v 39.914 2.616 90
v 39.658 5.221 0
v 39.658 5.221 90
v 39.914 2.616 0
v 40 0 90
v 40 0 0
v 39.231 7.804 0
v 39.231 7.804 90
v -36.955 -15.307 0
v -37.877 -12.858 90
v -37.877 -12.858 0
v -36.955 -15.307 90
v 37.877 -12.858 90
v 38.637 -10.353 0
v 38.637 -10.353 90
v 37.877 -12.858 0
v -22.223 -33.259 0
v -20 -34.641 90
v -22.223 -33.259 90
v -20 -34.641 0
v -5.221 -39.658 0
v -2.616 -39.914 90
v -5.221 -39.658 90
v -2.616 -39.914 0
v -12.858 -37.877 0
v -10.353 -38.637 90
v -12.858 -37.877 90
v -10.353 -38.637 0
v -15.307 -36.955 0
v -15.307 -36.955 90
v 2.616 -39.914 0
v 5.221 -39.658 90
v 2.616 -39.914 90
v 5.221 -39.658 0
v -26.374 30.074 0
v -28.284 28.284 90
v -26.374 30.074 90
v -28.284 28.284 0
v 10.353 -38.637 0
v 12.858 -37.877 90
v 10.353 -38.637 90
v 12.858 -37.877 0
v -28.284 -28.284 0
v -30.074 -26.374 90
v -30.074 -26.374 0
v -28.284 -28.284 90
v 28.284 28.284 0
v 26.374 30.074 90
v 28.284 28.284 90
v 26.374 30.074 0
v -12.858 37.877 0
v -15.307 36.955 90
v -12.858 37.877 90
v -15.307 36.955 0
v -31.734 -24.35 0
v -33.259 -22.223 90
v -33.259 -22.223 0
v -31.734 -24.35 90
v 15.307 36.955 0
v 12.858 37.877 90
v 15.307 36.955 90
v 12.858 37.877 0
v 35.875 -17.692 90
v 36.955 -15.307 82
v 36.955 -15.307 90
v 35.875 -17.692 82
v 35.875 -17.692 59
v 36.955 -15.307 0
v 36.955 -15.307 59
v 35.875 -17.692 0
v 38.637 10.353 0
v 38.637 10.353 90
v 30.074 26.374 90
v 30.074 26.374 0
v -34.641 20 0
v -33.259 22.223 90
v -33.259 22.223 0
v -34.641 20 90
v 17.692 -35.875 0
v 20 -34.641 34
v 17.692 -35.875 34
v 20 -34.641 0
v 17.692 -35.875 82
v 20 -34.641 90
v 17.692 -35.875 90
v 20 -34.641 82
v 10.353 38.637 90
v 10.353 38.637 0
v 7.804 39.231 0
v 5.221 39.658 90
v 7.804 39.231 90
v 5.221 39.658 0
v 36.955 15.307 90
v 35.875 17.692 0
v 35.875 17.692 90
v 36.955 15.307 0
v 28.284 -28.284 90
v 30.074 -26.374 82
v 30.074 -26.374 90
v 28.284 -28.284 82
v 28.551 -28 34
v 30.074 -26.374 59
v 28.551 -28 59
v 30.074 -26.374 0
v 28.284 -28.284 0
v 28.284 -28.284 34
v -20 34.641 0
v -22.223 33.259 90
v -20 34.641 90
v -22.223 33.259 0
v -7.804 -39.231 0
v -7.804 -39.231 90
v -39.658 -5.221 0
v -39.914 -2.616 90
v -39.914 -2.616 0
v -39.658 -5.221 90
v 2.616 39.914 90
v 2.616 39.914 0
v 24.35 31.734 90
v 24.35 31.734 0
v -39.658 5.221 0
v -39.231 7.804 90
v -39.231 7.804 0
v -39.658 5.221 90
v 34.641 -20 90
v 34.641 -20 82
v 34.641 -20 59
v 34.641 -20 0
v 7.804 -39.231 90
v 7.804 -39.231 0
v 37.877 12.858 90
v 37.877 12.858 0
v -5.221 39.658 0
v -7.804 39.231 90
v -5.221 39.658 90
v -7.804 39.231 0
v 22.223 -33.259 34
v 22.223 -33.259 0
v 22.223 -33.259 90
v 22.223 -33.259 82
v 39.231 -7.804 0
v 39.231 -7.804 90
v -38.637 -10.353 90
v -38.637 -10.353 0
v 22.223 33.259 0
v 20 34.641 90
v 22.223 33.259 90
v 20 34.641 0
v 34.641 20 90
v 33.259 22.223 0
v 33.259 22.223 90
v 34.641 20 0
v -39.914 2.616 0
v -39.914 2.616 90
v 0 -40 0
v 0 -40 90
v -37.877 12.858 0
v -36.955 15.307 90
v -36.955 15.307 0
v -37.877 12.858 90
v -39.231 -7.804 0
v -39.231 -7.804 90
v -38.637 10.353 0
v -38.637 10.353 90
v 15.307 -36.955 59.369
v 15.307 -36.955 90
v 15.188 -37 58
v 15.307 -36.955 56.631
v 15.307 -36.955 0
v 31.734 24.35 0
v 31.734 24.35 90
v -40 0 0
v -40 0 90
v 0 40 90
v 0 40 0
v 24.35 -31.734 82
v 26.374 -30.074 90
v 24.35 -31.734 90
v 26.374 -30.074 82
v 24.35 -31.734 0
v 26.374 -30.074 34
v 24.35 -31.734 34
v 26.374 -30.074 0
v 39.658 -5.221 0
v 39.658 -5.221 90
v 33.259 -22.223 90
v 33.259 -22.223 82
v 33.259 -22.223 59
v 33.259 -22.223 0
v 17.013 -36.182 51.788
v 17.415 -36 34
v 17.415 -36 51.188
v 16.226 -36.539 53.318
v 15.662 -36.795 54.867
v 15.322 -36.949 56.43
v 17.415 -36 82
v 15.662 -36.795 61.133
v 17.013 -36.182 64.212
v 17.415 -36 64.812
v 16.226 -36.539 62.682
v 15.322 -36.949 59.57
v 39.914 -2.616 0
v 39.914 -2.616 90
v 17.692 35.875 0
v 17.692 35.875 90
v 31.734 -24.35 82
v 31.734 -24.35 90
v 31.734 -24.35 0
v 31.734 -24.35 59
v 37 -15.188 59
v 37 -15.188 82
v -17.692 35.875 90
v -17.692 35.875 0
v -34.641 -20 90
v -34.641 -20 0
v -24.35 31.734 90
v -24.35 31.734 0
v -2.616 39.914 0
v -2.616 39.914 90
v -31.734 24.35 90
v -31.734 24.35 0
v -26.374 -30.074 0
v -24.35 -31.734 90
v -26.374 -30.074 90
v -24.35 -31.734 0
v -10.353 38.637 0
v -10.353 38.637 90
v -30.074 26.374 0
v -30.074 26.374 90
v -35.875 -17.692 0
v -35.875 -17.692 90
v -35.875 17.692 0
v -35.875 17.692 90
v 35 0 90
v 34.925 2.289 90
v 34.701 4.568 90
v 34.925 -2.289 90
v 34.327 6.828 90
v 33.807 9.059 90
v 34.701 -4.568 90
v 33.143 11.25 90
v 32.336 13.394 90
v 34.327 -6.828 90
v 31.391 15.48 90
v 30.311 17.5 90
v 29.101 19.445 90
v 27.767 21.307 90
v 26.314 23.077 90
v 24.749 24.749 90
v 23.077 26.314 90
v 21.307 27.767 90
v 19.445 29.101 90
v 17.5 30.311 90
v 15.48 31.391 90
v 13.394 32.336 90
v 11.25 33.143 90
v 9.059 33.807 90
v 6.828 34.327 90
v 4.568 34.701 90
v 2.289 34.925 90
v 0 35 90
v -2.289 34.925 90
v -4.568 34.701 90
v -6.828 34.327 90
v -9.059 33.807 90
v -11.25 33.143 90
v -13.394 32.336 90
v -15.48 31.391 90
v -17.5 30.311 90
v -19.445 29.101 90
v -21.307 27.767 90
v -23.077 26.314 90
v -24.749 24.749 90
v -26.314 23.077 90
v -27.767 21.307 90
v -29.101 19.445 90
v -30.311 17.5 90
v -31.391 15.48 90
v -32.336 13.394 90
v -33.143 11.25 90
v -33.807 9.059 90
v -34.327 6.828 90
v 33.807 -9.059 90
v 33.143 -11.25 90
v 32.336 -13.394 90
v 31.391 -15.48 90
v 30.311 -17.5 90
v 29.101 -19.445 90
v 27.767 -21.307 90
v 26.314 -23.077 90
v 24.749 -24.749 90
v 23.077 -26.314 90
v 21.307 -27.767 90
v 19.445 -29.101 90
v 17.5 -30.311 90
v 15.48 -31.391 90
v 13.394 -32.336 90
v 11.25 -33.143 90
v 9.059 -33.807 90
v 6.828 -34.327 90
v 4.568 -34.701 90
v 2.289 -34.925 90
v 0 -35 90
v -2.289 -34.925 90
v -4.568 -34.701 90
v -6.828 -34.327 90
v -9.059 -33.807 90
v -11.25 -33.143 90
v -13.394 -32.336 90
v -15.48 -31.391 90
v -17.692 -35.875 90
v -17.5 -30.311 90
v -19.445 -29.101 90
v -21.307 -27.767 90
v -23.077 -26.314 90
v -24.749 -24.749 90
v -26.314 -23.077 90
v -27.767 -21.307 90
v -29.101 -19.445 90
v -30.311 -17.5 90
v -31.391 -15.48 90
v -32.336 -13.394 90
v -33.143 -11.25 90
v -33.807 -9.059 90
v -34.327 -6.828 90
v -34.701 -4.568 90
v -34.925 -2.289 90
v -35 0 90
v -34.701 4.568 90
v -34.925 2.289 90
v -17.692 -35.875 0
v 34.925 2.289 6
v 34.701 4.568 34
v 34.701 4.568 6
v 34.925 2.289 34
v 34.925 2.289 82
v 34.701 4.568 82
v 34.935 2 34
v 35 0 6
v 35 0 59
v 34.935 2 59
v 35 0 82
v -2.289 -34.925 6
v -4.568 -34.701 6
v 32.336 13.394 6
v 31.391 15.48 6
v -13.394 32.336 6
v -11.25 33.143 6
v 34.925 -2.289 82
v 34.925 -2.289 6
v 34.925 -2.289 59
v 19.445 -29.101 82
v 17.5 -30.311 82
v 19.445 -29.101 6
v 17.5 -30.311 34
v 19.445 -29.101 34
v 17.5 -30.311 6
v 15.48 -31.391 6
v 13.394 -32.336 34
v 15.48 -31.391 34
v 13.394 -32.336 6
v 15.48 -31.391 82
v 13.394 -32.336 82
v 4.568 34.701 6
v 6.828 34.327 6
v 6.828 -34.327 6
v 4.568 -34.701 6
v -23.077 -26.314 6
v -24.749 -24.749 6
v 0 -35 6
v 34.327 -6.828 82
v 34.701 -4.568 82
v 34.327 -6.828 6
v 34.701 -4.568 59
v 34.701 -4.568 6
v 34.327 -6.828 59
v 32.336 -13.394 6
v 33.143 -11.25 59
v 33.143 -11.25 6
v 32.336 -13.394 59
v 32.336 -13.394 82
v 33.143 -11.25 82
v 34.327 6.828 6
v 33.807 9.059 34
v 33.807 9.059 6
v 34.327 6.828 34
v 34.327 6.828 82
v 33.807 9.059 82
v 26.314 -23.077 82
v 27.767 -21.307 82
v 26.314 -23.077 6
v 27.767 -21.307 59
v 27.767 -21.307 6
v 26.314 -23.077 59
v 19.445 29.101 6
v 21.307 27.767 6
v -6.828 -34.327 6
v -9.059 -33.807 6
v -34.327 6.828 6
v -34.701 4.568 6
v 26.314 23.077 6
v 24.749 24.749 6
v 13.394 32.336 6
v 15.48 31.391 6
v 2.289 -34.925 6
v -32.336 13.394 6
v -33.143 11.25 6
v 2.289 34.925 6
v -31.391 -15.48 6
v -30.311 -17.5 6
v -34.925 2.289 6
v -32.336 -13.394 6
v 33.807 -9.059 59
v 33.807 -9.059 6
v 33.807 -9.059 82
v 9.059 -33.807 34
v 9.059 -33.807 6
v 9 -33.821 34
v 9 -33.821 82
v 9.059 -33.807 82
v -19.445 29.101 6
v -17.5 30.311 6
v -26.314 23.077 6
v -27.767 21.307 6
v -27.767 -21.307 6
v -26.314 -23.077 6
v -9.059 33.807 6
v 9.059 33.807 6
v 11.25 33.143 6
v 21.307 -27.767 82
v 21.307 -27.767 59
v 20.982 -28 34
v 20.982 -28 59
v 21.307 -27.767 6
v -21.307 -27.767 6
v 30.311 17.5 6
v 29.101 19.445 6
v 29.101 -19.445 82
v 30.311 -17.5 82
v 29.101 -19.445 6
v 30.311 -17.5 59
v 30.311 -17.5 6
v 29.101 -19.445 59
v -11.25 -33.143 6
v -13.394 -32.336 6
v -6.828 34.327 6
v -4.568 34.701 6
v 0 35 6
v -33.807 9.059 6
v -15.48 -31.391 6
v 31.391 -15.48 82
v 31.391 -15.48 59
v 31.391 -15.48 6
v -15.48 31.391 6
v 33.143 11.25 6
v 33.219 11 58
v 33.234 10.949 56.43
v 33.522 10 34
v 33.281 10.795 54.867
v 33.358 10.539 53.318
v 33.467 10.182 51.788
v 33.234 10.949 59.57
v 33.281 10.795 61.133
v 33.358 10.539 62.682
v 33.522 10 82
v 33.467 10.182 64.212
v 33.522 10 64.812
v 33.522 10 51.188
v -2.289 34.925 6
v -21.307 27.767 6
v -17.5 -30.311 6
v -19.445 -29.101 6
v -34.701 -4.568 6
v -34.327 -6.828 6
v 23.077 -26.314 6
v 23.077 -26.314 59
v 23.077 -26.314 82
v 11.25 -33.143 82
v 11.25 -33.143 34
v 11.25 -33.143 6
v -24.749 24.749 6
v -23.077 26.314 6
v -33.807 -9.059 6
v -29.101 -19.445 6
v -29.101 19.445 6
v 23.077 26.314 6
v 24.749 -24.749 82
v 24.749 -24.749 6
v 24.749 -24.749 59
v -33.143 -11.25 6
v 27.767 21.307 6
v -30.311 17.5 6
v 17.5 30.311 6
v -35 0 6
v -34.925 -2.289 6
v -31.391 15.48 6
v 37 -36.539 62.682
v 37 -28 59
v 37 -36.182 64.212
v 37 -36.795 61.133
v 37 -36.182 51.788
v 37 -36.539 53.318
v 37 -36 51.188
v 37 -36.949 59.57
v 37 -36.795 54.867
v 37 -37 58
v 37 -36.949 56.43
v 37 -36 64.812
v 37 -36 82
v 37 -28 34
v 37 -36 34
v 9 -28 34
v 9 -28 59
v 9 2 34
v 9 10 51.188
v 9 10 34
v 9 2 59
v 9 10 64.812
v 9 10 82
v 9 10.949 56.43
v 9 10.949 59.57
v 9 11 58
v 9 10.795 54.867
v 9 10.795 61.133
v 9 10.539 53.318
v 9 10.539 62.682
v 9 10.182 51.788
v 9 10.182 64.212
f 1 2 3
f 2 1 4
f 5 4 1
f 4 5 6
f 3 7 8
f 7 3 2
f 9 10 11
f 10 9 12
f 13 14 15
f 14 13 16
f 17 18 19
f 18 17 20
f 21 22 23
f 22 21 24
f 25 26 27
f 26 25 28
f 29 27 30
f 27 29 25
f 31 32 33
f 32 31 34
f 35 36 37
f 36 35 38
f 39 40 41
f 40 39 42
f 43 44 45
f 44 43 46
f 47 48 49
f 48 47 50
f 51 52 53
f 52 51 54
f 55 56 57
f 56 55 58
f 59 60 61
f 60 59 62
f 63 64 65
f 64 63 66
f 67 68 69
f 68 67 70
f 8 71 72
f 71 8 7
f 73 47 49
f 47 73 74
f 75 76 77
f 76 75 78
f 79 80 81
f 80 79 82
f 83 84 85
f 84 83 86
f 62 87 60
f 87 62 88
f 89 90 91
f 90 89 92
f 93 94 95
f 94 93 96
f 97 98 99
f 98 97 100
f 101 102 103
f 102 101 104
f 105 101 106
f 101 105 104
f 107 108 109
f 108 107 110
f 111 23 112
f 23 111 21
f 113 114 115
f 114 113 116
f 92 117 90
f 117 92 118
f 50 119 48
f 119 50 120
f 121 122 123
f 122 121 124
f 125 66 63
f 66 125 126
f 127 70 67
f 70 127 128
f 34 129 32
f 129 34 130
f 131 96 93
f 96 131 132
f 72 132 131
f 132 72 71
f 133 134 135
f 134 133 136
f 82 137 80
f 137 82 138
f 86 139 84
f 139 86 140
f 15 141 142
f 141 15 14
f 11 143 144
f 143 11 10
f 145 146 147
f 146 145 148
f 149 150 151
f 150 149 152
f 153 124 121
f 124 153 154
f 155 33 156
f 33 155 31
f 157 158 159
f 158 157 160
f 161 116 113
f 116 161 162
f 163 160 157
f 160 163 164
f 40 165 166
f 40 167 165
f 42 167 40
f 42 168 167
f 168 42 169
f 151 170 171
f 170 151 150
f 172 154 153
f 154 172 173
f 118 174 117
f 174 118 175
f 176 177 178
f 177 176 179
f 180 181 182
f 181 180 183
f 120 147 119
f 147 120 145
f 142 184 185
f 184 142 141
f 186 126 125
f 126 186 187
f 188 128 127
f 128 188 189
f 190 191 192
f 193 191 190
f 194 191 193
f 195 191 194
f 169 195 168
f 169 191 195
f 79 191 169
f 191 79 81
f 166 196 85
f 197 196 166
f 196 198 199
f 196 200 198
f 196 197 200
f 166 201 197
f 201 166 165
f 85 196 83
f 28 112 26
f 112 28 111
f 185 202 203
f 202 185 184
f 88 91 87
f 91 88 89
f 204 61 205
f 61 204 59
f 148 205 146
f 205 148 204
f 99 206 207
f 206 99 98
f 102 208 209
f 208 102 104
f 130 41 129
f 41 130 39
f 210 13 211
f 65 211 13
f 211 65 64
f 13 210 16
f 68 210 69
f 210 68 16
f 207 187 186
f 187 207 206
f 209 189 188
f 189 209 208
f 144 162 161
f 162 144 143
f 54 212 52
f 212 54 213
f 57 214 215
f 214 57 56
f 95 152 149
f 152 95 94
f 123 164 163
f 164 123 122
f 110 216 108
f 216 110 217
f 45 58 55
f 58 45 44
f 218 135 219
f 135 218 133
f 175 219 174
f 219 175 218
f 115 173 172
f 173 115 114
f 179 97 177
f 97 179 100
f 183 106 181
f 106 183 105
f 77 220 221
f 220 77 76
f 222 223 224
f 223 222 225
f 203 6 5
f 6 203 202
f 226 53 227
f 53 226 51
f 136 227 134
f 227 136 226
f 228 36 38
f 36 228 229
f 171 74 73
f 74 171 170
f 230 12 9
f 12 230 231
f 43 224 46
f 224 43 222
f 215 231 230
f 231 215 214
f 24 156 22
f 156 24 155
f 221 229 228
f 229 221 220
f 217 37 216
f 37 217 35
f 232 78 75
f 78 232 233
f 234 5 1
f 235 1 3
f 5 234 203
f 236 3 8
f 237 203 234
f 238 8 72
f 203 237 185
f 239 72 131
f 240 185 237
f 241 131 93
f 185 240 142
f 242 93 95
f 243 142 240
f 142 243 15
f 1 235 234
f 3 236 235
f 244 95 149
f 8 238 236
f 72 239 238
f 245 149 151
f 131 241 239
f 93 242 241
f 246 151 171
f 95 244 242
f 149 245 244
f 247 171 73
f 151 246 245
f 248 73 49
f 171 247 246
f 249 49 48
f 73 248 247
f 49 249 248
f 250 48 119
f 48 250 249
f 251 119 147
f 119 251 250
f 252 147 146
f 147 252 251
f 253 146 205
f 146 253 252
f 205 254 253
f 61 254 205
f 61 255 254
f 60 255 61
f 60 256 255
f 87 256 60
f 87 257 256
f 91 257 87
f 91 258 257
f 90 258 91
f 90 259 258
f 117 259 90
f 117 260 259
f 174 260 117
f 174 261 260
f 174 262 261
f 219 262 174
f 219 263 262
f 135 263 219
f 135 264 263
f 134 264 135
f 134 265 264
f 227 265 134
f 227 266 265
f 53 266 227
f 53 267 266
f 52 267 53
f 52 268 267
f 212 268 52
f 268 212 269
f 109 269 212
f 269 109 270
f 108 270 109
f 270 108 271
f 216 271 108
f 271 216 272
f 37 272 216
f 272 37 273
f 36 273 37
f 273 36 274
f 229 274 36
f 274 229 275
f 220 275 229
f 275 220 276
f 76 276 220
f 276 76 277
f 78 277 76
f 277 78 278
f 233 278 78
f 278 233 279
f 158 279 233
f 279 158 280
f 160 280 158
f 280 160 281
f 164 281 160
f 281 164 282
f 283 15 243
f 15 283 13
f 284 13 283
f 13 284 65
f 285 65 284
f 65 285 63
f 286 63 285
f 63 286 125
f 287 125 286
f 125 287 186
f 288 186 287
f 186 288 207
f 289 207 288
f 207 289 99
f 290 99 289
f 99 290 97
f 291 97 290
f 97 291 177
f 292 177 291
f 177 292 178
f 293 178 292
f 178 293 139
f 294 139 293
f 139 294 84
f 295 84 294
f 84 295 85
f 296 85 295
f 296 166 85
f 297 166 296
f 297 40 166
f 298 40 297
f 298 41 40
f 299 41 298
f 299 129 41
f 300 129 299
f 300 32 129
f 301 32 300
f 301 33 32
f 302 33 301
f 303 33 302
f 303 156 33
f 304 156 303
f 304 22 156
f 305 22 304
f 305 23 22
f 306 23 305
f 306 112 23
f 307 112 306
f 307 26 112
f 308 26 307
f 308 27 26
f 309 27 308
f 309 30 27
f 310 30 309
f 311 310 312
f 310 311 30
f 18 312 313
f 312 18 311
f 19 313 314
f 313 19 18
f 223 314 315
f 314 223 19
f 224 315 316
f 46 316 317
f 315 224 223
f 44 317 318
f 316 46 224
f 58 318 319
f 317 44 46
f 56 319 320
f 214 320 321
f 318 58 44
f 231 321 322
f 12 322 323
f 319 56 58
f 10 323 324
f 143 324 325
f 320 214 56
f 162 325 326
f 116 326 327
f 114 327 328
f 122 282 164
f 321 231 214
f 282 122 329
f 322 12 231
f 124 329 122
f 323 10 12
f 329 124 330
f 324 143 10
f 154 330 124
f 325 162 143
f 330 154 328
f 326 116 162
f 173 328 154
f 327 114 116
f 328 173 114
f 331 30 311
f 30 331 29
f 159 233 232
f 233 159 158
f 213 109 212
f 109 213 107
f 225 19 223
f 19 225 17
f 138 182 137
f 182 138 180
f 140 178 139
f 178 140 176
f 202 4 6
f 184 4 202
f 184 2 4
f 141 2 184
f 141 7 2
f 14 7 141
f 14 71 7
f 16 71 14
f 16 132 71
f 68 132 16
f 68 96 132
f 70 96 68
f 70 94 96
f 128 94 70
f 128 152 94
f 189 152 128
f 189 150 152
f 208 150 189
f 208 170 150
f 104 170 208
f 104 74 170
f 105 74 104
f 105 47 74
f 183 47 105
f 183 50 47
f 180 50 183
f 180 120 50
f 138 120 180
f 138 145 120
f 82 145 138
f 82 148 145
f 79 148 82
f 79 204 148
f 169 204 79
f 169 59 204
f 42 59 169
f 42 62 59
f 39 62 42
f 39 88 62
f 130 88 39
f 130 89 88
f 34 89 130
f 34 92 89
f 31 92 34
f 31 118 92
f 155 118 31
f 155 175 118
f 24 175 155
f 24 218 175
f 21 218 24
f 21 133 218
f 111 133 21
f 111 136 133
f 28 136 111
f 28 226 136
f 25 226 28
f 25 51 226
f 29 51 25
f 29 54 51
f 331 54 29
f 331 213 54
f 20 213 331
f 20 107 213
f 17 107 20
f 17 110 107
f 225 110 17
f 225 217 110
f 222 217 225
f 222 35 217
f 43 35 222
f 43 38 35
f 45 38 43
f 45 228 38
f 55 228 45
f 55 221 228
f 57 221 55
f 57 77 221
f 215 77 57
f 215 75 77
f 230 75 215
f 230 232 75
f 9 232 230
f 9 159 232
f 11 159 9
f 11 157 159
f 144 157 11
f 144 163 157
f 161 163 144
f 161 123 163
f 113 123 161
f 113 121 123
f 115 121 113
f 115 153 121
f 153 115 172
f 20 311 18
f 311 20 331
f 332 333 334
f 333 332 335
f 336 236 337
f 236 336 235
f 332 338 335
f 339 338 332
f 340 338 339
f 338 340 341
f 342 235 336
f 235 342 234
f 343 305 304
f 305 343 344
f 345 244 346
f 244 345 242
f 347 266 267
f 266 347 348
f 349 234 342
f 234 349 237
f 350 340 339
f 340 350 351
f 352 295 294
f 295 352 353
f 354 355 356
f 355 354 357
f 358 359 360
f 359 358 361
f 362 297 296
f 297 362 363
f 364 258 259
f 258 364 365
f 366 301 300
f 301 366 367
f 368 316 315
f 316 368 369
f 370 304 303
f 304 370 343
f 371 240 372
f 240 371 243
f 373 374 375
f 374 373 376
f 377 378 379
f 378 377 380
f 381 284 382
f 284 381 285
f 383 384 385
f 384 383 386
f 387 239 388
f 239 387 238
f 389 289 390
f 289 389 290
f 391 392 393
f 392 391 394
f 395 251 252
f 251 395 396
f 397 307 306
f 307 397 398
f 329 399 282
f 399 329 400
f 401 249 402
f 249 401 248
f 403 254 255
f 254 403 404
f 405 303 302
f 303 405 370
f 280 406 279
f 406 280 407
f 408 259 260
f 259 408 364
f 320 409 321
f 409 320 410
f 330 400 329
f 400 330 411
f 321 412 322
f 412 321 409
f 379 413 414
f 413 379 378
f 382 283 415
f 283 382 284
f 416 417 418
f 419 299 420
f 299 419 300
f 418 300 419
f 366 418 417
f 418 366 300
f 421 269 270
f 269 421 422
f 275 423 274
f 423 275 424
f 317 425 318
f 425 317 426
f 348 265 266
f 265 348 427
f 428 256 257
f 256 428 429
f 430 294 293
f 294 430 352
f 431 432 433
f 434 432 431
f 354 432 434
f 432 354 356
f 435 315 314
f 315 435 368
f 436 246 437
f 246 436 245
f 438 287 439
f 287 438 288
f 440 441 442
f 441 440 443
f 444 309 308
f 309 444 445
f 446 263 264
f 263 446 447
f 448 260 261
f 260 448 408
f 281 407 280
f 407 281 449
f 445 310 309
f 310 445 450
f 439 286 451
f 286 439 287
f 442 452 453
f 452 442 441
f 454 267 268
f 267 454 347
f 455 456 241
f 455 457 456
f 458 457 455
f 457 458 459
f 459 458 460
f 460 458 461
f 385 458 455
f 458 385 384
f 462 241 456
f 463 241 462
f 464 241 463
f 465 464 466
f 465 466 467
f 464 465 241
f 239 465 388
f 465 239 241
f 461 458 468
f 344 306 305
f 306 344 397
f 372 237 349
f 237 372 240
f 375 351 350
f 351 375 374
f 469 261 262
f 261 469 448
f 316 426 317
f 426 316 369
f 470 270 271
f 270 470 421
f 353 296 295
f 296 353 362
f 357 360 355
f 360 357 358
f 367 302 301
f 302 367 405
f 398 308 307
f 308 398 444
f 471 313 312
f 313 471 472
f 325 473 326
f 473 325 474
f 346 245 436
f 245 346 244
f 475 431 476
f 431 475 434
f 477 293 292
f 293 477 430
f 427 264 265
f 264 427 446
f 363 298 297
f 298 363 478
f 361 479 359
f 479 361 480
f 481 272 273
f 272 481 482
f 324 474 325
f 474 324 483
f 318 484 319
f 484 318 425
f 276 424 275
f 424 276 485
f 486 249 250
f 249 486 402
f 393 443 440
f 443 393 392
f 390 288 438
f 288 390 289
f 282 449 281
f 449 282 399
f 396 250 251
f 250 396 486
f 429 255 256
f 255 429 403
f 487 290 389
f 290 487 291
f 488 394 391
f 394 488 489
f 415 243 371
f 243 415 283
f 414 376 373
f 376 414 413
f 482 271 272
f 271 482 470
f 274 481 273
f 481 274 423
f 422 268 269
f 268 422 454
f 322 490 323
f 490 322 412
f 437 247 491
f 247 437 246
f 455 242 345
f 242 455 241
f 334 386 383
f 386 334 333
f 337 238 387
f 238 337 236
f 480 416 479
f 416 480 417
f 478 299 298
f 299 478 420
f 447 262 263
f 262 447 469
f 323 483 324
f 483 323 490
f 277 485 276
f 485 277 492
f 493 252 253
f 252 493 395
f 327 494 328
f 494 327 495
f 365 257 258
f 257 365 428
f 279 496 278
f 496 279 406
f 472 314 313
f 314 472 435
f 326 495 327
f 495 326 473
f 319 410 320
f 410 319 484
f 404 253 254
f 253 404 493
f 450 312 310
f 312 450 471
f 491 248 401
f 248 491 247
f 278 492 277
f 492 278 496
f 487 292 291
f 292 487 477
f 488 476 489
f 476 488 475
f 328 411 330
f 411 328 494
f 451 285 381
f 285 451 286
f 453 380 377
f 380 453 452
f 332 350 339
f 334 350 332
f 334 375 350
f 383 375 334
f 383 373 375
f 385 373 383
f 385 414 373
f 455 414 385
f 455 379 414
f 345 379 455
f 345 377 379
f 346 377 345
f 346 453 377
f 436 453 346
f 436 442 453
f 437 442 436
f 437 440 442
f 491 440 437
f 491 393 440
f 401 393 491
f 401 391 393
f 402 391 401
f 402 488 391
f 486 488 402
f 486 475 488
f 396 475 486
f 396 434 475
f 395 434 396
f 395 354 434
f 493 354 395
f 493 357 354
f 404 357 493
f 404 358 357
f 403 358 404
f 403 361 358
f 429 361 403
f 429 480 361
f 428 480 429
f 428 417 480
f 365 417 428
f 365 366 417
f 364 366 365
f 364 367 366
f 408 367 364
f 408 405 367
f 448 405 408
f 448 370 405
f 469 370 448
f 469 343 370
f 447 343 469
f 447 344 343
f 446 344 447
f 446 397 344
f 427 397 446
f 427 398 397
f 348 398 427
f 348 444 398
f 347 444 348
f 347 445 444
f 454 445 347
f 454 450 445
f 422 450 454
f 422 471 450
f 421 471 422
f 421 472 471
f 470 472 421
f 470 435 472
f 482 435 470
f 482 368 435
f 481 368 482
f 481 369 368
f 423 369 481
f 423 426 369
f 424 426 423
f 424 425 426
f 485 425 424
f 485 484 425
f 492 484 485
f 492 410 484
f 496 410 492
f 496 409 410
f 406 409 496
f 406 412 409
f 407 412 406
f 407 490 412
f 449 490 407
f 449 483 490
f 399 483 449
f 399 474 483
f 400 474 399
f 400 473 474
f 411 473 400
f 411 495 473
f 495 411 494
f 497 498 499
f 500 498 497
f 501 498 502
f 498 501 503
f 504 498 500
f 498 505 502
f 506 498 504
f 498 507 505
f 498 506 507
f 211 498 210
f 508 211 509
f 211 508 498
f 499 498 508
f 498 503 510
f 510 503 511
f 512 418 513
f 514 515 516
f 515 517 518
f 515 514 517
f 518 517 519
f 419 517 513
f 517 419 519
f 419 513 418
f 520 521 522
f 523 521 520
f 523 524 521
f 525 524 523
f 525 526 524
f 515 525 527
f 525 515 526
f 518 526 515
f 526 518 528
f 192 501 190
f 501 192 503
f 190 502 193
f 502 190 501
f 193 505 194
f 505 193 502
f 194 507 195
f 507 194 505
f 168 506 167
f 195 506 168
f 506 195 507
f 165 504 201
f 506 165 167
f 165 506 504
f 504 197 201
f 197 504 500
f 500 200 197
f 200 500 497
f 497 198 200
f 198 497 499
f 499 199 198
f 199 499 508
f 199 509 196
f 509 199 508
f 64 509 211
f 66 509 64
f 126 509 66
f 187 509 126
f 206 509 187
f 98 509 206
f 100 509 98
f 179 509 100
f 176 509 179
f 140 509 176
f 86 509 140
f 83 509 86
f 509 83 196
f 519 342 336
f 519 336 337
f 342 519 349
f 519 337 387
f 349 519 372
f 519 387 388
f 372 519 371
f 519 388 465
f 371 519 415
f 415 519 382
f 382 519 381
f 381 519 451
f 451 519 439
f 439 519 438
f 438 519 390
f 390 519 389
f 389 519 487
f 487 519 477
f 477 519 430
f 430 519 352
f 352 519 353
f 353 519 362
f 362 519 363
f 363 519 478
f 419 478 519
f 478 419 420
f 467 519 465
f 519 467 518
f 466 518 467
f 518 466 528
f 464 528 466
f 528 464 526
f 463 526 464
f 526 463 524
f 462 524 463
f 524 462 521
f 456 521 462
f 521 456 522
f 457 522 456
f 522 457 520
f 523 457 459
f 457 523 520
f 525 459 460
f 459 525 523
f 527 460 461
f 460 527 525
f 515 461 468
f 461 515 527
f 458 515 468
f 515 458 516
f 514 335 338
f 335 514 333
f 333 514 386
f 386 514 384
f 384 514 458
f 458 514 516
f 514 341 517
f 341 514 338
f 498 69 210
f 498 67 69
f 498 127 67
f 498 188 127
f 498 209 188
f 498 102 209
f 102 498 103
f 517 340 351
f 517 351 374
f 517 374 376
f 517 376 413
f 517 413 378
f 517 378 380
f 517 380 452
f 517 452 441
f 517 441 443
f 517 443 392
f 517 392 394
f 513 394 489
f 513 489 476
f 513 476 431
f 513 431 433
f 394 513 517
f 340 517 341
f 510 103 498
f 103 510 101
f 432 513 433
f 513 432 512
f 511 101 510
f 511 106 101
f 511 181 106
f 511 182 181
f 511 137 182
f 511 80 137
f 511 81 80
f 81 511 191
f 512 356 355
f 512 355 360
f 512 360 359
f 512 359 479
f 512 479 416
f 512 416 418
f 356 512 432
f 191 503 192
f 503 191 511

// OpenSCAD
// OpenSCAD: マグカップ（指定向きの D 字ハンドル：+X 側のみ）
// 本体: 外径 80mm、内径 70mm、肉厚 5mm、高さ 90mm、底厚 6mm
// 取手: +X 側のみ、D 字形状、内側の開口高さ 30mm × 幅 25mm、マグ高さ中央付近に配置
// 本体と取手は確実に union（オーバーラップを持たせて接続）

$fn = 96; // なめらかさ

// 基本パラメータ
outer_diam = 80;
inner_diam = 70;
thickness = (outer_diam - inner_diam) / 2; // 5 mm
cup_height = 90;
bottom_thickness = 6;

cup_outer_r = outer_diam / 2;
cup_inner_r = inner_diam / 2;
cup_inner_height = cup_height - bottom_thickness; // 飲み物を入れられる高さ

// 取手パラメータ
handle_open_h = 30; // 取手の内側の高さ (Z方向)
handle_open_w = 25; // 取手の内側の幅 (Y方向, マグ本体側から外向きの距離)
handle_center_z = cup_height / 2; // 高さ方向中央付近
// 取手の外形（半円＋直線の D 字）。平面 (Y,Z) で作り、X方向に押し出す。
handle_penetration = 6; // マグ本体へめり込ませる量（確実に接続させる）
handle_extrude_neg = -8; // 押し出しの負側（マグ中心方向へめり込む）
handle_extrude_pos = 20; // 押し出しのプラス側（外側への厚み）
handle_outer_radius = 24; // 取手外側の半円半径（見た目と強度用）

// 取手の平面配置（Y方向）
handle_flat_y = cup_outer_r - handle_penetration; // 平らな内側がこの y に来る（本体に近接）
handle_circle_center_y = handle_flat_y + handle_outer_radius; // 半円の中心位置（Y）

// 取手の垂直方向（Z）境界（外側の形状の余裕を持たせる）
handle_extra_h = 8; // 上下に余裕を持たせる（面取り用）
handle_outer_z1 = handle_center_z - (handle_open_h/2) - handle_extra_h;
handle_outer_z2 = handle_center_z + (handle_open_h/2) + handle_extra_h;

// 取手内側切り欠き（指を入れる空間）の矩形（Y,Z）
handle_cut_y1 = handle_flat_y;
handle_cut_y2 = handle_flat_y + handle_open_w;
handle_cut_z1 = handle_center_z - (handle_open_h/2);
handle_cut_z2 = handle_center_z + (handle_open_h/2);

// メイン
module mug_body() {
    // 外殻
    difference() {
        // 外側筒（底付き）
        union() {
            // 外筒
            translate([0,0,0])
                cylinder(h = cup_height, r = cup_outer_r);
            // 底板（底の厚みを明示的に付け足す必要は無いが確実化）
            translate([0,0,0])
                cylinder(h = bottom_thickness, r = cup_outer_r);
        }
        // 内側くり抜き（中空）
        translate([0,0,bottom_thickness])
            cylinder(h = cup_inner_height, r = cup_inner_r);
    }
}

module handle_solid() {
    // 2D プロファイルを作って X 方向に線形押し出し
    // Y-Z 平面で作業する（ここでは 2D を作るために translate で平面調整）
    translate([0,0,0]) {
        linear_extrude(height = handle_extrude_pos - handle_extrude_neg, center = false, convexity = 10)
            translate([0,0]) // no-op, keep coords clear
                difference() {
                    // 外形: 半円 (右側) と矩形（左側の平ら部分を含む）
                    union() {
                        // 半円（円の上半分＋下半分を合わせるが、矩形と和を取ることで D 字になる）
                        translate([handle_circle_center_y, handle_center_z])
                            circle(r = handle_outer_radius);
                        // 平らな左側を埋める矩形（半円の左端から左側へ伸ばす）
                        translate([handle_flat_y, handle_outer_z1])
                            square([ (handle_circle_center_y + handle_outer_radius) - handle_flat_y, (handle_outer_z2 - handle_outer_z1) ], center = false);
                    }
                    // 指を入れるための切り欠き（矩形で切る）
                    translate([handle_cut_y1, handle_cut_z1])
                        square([ handle_cut_y2 - handle_cut_y1, handle_cut_z2 - handle_cut_z1 ], center = false);
                    // また縦方向の角を少し丸めたい場合はここで更に小さな丸を差し引く等できる（今回は矩形切り抜きで要件満たす）
                }
            ;
    }
}

// 全体配置
module mug_with_handle() {
    // 本体
    mug_body();
    // 取手（押し出しは X 方向なので、2D プロファイルの原点を X=handle_extrude_neg に合わせる）
    // linear_extrude のデフォルトは Z 方向押し出しなので、上で Z を使ったがここは X に押し出すため rotate する
}

// 実体化：座標系を合わせて union (確実に接続するために取手を少しめり込ませてある)
union() {
    // マグ本体（Z 方向が高さ）
    translate([0,0,0])
        mug_body();

    // 取手：先に作った 2D を X 押し出しにするため rotate と translate を適用
    // ここでは作りやすさのため、上で定義した linear_extrude は Z 押し出しなので rotate して X 方向へ
    translate([handle_extrude_neg, 0, 0]) // 押し出しの負側をマイナス X へオフセット
        rotate([0, -90, 0]) // Z 押し出しを X 押し出しに変換
            translate([0, -handle_circle_center_y, -handle_center_z]) // 2D プロファイルの中心位置調整
                handle_solid();
}

// 内部空洞（飲み物領域）を最後に差し引いて完成（取手は本体とユニオン済みのため問題なし）
difference() {
    // これまでの union（本体+取手）はすでに描かれているため再描画
    // To ensure correct boolean ordering, recreate base solids then subtract interior
    union() {
        mug_body();
        translate([handle_extrude_neg, 0, 0])
            rotate([0, -90, 0])
                translate([0, -handle_circle_center_y, -handle_center_z])
                    handle_solid();
    }
    // 内側くり抜き（飲み物領域）
    translate([0,0,bottom_thickness])
        cylinder(h = cup_inner_height, r = cup_inner_r);
}
